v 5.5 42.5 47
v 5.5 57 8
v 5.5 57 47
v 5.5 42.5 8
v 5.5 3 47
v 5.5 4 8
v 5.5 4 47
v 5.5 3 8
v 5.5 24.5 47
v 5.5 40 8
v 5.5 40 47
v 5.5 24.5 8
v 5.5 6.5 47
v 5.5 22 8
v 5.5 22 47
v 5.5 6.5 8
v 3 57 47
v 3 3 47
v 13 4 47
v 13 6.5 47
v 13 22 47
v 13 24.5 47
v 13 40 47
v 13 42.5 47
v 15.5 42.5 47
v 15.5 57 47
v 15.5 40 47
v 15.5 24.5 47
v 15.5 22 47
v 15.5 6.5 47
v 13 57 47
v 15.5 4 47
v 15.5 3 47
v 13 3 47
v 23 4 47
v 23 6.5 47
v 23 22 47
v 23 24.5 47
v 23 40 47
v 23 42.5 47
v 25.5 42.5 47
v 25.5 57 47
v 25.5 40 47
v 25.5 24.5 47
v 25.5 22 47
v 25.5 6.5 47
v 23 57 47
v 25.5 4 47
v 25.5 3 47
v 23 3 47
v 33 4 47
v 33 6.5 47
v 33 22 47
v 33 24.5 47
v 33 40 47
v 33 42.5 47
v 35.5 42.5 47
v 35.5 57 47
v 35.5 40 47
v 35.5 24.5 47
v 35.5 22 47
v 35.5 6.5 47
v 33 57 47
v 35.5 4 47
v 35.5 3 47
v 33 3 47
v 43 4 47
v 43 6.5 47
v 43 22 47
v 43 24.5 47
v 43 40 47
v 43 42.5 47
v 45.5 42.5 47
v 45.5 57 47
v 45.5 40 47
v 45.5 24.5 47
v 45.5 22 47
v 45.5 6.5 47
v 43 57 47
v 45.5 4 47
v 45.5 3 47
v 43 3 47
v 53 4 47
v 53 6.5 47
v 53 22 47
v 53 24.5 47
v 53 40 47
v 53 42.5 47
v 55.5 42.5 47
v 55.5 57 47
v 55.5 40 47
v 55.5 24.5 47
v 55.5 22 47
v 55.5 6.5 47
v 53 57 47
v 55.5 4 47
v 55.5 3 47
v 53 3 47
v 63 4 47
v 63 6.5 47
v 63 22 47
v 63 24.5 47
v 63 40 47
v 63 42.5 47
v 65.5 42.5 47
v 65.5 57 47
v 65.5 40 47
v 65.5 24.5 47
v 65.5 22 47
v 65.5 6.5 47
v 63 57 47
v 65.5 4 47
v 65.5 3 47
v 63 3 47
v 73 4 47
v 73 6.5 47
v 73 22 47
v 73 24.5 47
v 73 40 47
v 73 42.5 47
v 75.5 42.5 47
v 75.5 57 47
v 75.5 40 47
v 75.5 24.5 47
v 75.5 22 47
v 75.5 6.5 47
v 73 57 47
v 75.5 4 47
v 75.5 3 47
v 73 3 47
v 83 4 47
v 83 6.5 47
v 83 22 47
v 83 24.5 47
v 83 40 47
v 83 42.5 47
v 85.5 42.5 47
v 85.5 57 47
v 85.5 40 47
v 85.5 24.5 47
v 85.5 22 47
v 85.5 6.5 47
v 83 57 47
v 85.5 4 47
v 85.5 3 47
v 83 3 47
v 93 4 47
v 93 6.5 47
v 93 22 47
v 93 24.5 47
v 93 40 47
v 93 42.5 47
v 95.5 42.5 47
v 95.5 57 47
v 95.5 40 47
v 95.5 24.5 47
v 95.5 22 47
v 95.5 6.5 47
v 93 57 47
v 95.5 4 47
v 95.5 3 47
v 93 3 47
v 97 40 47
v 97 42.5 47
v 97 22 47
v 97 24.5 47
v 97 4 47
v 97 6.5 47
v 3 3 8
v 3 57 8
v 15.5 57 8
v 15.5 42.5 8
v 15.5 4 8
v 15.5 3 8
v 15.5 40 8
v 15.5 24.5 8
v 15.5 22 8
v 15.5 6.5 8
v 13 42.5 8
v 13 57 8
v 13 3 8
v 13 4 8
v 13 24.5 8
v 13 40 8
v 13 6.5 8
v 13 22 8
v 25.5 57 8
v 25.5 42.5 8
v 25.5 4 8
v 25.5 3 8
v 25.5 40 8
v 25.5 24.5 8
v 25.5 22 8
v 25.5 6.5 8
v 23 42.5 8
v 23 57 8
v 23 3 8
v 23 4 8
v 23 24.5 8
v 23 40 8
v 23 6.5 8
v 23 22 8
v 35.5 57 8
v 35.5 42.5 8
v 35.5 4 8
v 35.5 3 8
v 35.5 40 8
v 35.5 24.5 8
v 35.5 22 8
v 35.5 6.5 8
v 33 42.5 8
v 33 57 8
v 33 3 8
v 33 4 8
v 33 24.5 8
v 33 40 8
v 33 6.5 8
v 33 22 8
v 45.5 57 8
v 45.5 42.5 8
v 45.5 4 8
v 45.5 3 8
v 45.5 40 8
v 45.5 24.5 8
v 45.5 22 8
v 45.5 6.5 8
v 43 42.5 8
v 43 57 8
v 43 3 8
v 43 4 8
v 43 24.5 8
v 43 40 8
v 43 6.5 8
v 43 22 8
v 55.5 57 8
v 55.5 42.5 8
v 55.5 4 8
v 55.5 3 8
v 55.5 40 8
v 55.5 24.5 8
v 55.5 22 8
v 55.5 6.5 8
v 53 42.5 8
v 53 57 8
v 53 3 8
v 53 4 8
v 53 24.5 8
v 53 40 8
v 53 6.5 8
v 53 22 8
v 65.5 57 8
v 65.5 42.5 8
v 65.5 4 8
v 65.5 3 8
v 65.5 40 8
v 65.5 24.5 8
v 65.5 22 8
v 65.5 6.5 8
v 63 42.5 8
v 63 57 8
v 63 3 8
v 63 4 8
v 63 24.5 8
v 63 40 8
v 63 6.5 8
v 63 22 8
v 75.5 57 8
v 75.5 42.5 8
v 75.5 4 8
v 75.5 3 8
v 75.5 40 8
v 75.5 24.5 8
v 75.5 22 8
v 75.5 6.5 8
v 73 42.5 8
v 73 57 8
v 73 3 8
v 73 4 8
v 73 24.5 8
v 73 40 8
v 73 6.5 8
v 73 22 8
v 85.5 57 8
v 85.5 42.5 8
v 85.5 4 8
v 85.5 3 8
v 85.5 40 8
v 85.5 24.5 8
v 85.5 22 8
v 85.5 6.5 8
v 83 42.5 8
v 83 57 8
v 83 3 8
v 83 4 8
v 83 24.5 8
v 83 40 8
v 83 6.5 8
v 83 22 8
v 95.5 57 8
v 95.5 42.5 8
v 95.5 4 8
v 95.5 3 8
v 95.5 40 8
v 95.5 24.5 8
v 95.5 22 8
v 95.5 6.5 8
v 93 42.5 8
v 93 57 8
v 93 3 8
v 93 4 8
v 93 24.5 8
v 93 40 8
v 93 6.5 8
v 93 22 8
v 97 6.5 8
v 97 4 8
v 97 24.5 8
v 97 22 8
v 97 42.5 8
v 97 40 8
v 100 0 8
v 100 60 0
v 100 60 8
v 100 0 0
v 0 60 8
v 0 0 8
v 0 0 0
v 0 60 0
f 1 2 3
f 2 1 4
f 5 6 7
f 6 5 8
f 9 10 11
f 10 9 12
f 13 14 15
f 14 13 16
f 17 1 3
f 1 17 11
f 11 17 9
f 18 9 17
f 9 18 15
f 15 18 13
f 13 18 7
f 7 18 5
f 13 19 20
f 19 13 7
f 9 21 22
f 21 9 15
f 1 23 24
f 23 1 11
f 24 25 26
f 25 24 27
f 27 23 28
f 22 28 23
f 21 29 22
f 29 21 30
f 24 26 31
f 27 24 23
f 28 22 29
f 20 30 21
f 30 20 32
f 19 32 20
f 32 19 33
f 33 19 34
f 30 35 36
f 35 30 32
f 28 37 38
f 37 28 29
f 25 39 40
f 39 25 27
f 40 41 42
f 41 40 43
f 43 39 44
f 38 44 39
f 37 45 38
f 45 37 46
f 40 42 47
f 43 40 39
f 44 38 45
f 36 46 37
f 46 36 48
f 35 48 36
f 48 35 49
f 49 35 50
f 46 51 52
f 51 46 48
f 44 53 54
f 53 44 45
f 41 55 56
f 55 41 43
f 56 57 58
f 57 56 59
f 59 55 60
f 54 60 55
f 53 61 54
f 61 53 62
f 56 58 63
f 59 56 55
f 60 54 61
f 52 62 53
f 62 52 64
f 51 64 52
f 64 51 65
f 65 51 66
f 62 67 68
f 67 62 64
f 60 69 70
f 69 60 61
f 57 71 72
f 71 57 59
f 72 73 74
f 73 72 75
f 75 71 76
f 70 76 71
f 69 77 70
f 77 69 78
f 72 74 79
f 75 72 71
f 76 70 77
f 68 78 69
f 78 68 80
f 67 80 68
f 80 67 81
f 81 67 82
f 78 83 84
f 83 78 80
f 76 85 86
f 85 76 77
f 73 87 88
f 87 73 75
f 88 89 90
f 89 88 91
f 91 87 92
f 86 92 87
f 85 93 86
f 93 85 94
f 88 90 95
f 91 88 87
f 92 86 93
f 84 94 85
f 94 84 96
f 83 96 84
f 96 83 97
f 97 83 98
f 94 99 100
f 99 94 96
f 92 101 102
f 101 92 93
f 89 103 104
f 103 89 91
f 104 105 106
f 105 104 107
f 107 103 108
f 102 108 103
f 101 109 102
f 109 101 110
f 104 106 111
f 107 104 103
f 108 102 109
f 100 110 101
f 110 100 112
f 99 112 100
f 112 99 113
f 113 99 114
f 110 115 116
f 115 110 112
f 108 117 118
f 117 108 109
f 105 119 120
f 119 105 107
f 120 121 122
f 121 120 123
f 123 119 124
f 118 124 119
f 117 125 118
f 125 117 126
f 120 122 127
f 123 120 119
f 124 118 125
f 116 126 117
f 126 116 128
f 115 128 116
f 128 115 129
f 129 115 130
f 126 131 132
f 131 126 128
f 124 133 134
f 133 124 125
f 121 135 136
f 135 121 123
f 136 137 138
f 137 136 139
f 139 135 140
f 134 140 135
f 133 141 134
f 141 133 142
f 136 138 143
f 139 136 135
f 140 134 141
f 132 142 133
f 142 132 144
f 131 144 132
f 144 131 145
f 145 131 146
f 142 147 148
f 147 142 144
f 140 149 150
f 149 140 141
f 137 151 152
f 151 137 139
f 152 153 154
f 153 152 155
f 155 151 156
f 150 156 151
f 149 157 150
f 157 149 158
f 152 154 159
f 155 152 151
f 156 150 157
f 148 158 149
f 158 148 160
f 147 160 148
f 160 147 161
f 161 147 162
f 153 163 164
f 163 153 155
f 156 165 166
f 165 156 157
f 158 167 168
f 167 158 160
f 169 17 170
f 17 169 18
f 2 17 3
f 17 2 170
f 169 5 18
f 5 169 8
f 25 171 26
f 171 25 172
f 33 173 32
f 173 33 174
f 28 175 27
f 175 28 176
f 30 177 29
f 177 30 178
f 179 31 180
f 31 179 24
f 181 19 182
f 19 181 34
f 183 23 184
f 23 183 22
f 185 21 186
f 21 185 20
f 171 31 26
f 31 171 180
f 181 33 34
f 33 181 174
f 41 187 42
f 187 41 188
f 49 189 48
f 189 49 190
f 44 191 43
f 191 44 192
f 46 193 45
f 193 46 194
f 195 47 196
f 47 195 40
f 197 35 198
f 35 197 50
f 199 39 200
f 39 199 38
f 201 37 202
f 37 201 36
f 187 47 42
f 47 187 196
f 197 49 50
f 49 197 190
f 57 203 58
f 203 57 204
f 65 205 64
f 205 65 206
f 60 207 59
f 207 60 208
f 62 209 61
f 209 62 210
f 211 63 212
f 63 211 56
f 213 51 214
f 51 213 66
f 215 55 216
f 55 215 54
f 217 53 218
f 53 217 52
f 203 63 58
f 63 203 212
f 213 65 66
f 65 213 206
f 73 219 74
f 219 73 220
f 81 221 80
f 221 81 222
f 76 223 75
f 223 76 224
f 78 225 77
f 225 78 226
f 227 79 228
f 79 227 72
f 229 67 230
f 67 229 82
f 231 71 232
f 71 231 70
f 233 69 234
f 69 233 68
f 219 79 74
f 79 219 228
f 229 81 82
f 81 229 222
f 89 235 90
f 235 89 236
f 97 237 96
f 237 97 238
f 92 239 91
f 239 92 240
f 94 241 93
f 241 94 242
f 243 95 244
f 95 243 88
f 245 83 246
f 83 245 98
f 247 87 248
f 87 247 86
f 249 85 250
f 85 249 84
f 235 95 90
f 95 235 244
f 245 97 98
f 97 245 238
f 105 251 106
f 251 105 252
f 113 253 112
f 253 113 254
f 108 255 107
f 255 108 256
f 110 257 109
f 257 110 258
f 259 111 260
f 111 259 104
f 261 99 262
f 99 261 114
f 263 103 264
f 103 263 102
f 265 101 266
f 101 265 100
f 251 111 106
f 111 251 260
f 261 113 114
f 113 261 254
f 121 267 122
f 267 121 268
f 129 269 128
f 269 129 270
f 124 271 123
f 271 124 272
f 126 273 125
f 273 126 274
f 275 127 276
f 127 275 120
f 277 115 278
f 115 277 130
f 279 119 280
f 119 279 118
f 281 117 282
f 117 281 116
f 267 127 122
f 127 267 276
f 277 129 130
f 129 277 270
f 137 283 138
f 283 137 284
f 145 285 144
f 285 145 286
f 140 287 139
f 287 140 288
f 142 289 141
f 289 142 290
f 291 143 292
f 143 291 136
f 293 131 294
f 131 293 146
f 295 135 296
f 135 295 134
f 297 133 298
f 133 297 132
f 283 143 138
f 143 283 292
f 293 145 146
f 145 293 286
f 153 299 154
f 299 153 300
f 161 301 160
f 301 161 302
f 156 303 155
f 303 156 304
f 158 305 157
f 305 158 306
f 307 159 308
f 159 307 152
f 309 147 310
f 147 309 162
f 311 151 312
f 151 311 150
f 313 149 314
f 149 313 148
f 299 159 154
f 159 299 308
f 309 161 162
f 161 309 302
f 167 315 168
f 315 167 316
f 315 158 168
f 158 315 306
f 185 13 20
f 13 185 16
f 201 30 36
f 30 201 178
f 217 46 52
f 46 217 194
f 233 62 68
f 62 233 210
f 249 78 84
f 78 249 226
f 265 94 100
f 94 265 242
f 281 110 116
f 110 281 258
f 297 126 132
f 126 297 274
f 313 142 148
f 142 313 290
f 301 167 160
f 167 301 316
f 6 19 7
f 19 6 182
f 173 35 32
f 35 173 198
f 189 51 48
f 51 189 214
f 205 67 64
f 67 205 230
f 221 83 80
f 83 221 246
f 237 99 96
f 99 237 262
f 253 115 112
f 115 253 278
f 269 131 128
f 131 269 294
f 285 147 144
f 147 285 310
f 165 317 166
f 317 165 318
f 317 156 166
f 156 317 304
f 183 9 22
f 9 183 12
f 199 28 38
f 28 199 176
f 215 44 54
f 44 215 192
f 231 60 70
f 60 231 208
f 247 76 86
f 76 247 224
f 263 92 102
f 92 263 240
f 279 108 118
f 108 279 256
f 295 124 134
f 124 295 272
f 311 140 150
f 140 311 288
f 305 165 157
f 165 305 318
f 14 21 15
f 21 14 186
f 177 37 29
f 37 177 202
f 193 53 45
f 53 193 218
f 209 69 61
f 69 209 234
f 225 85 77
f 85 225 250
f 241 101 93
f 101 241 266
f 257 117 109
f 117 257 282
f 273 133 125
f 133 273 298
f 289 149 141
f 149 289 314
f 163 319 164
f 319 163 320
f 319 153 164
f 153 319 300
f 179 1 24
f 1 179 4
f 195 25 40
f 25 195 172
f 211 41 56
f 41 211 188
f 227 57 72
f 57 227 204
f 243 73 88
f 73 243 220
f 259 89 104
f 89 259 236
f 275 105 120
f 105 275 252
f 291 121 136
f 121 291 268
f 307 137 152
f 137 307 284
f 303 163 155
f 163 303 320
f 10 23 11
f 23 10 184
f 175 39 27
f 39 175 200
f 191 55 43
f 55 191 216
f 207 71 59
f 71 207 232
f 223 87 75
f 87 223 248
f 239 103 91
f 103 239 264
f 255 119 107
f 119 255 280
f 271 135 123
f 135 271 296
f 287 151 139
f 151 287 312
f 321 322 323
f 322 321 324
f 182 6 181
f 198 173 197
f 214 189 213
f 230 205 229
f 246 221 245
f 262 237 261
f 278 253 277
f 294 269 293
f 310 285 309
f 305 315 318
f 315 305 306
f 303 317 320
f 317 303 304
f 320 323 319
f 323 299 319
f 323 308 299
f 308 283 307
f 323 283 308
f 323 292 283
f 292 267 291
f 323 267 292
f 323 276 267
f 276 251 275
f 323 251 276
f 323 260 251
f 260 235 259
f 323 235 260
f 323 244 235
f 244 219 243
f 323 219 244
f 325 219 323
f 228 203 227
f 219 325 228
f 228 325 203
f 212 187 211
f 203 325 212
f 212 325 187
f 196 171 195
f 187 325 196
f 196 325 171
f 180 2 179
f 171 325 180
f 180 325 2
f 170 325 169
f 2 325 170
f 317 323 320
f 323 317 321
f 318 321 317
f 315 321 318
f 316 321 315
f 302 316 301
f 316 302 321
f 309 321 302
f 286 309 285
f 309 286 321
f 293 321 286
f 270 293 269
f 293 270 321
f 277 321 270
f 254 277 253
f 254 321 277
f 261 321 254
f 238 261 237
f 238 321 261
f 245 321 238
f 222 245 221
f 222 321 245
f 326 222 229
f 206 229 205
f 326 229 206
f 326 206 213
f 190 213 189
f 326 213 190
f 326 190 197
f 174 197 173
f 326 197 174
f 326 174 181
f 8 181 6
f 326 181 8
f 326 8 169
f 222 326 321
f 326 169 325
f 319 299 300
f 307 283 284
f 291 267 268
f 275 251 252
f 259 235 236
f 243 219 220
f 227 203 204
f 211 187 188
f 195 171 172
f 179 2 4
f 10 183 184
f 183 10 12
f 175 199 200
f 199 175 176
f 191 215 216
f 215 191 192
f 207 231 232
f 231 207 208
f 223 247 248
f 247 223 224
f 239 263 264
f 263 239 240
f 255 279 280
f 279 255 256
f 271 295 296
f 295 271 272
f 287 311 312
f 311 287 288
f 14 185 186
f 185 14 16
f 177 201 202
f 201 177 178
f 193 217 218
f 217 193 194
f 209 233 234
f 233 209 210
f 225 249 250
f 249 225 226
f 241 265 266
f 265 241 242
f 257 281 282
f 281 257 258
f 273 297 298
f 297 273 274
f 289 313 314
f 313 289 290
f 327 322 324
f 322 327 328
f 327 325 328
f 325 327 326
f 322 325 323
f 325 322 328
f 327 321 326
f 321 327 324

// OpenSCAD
$fn = 32;

// ----------------------------------------------------------------------
// Heatsink: cross fin block
// ----------------------------------------------------------------------

// --- parameters (mm) ---
base_l = 100;             // base length, X
base_w = 60;              // base width, Y
base_t = 8;               // base plate thickness
fin_h = 40;               // fin height above the base
fin_t = 2.5;              // fin thickness
edge = 3;                 // margin from the base ends
pitch = 10;               // fin pitch
rib_pitch = 18;           // cross rib pitch

n_fins = floor((base_l - 2 * edge - fin_t) / pitch) + 1;  // fin count
total_h = base_t + fin_h - 1;  // overall height
n_ribs = floor((base_w - 2 * edge) / rib_pitch);  // rib count

union() {
  cube([base_l, base_w, base_t]);
  for (i = [0 : n_fins - 1])
    translate([edge + i * pitch, edge, base_t - 1])
      cube([fin_t, base_w - 2 * edge, fin_h]);
  for (i = [0 : n_ribs - 1])
    translate([edge, edge + 1 + i * rib_pitch, base_t - 1])
      cube([base_l - 2 * edge, fin_t, fin_h]);
}
